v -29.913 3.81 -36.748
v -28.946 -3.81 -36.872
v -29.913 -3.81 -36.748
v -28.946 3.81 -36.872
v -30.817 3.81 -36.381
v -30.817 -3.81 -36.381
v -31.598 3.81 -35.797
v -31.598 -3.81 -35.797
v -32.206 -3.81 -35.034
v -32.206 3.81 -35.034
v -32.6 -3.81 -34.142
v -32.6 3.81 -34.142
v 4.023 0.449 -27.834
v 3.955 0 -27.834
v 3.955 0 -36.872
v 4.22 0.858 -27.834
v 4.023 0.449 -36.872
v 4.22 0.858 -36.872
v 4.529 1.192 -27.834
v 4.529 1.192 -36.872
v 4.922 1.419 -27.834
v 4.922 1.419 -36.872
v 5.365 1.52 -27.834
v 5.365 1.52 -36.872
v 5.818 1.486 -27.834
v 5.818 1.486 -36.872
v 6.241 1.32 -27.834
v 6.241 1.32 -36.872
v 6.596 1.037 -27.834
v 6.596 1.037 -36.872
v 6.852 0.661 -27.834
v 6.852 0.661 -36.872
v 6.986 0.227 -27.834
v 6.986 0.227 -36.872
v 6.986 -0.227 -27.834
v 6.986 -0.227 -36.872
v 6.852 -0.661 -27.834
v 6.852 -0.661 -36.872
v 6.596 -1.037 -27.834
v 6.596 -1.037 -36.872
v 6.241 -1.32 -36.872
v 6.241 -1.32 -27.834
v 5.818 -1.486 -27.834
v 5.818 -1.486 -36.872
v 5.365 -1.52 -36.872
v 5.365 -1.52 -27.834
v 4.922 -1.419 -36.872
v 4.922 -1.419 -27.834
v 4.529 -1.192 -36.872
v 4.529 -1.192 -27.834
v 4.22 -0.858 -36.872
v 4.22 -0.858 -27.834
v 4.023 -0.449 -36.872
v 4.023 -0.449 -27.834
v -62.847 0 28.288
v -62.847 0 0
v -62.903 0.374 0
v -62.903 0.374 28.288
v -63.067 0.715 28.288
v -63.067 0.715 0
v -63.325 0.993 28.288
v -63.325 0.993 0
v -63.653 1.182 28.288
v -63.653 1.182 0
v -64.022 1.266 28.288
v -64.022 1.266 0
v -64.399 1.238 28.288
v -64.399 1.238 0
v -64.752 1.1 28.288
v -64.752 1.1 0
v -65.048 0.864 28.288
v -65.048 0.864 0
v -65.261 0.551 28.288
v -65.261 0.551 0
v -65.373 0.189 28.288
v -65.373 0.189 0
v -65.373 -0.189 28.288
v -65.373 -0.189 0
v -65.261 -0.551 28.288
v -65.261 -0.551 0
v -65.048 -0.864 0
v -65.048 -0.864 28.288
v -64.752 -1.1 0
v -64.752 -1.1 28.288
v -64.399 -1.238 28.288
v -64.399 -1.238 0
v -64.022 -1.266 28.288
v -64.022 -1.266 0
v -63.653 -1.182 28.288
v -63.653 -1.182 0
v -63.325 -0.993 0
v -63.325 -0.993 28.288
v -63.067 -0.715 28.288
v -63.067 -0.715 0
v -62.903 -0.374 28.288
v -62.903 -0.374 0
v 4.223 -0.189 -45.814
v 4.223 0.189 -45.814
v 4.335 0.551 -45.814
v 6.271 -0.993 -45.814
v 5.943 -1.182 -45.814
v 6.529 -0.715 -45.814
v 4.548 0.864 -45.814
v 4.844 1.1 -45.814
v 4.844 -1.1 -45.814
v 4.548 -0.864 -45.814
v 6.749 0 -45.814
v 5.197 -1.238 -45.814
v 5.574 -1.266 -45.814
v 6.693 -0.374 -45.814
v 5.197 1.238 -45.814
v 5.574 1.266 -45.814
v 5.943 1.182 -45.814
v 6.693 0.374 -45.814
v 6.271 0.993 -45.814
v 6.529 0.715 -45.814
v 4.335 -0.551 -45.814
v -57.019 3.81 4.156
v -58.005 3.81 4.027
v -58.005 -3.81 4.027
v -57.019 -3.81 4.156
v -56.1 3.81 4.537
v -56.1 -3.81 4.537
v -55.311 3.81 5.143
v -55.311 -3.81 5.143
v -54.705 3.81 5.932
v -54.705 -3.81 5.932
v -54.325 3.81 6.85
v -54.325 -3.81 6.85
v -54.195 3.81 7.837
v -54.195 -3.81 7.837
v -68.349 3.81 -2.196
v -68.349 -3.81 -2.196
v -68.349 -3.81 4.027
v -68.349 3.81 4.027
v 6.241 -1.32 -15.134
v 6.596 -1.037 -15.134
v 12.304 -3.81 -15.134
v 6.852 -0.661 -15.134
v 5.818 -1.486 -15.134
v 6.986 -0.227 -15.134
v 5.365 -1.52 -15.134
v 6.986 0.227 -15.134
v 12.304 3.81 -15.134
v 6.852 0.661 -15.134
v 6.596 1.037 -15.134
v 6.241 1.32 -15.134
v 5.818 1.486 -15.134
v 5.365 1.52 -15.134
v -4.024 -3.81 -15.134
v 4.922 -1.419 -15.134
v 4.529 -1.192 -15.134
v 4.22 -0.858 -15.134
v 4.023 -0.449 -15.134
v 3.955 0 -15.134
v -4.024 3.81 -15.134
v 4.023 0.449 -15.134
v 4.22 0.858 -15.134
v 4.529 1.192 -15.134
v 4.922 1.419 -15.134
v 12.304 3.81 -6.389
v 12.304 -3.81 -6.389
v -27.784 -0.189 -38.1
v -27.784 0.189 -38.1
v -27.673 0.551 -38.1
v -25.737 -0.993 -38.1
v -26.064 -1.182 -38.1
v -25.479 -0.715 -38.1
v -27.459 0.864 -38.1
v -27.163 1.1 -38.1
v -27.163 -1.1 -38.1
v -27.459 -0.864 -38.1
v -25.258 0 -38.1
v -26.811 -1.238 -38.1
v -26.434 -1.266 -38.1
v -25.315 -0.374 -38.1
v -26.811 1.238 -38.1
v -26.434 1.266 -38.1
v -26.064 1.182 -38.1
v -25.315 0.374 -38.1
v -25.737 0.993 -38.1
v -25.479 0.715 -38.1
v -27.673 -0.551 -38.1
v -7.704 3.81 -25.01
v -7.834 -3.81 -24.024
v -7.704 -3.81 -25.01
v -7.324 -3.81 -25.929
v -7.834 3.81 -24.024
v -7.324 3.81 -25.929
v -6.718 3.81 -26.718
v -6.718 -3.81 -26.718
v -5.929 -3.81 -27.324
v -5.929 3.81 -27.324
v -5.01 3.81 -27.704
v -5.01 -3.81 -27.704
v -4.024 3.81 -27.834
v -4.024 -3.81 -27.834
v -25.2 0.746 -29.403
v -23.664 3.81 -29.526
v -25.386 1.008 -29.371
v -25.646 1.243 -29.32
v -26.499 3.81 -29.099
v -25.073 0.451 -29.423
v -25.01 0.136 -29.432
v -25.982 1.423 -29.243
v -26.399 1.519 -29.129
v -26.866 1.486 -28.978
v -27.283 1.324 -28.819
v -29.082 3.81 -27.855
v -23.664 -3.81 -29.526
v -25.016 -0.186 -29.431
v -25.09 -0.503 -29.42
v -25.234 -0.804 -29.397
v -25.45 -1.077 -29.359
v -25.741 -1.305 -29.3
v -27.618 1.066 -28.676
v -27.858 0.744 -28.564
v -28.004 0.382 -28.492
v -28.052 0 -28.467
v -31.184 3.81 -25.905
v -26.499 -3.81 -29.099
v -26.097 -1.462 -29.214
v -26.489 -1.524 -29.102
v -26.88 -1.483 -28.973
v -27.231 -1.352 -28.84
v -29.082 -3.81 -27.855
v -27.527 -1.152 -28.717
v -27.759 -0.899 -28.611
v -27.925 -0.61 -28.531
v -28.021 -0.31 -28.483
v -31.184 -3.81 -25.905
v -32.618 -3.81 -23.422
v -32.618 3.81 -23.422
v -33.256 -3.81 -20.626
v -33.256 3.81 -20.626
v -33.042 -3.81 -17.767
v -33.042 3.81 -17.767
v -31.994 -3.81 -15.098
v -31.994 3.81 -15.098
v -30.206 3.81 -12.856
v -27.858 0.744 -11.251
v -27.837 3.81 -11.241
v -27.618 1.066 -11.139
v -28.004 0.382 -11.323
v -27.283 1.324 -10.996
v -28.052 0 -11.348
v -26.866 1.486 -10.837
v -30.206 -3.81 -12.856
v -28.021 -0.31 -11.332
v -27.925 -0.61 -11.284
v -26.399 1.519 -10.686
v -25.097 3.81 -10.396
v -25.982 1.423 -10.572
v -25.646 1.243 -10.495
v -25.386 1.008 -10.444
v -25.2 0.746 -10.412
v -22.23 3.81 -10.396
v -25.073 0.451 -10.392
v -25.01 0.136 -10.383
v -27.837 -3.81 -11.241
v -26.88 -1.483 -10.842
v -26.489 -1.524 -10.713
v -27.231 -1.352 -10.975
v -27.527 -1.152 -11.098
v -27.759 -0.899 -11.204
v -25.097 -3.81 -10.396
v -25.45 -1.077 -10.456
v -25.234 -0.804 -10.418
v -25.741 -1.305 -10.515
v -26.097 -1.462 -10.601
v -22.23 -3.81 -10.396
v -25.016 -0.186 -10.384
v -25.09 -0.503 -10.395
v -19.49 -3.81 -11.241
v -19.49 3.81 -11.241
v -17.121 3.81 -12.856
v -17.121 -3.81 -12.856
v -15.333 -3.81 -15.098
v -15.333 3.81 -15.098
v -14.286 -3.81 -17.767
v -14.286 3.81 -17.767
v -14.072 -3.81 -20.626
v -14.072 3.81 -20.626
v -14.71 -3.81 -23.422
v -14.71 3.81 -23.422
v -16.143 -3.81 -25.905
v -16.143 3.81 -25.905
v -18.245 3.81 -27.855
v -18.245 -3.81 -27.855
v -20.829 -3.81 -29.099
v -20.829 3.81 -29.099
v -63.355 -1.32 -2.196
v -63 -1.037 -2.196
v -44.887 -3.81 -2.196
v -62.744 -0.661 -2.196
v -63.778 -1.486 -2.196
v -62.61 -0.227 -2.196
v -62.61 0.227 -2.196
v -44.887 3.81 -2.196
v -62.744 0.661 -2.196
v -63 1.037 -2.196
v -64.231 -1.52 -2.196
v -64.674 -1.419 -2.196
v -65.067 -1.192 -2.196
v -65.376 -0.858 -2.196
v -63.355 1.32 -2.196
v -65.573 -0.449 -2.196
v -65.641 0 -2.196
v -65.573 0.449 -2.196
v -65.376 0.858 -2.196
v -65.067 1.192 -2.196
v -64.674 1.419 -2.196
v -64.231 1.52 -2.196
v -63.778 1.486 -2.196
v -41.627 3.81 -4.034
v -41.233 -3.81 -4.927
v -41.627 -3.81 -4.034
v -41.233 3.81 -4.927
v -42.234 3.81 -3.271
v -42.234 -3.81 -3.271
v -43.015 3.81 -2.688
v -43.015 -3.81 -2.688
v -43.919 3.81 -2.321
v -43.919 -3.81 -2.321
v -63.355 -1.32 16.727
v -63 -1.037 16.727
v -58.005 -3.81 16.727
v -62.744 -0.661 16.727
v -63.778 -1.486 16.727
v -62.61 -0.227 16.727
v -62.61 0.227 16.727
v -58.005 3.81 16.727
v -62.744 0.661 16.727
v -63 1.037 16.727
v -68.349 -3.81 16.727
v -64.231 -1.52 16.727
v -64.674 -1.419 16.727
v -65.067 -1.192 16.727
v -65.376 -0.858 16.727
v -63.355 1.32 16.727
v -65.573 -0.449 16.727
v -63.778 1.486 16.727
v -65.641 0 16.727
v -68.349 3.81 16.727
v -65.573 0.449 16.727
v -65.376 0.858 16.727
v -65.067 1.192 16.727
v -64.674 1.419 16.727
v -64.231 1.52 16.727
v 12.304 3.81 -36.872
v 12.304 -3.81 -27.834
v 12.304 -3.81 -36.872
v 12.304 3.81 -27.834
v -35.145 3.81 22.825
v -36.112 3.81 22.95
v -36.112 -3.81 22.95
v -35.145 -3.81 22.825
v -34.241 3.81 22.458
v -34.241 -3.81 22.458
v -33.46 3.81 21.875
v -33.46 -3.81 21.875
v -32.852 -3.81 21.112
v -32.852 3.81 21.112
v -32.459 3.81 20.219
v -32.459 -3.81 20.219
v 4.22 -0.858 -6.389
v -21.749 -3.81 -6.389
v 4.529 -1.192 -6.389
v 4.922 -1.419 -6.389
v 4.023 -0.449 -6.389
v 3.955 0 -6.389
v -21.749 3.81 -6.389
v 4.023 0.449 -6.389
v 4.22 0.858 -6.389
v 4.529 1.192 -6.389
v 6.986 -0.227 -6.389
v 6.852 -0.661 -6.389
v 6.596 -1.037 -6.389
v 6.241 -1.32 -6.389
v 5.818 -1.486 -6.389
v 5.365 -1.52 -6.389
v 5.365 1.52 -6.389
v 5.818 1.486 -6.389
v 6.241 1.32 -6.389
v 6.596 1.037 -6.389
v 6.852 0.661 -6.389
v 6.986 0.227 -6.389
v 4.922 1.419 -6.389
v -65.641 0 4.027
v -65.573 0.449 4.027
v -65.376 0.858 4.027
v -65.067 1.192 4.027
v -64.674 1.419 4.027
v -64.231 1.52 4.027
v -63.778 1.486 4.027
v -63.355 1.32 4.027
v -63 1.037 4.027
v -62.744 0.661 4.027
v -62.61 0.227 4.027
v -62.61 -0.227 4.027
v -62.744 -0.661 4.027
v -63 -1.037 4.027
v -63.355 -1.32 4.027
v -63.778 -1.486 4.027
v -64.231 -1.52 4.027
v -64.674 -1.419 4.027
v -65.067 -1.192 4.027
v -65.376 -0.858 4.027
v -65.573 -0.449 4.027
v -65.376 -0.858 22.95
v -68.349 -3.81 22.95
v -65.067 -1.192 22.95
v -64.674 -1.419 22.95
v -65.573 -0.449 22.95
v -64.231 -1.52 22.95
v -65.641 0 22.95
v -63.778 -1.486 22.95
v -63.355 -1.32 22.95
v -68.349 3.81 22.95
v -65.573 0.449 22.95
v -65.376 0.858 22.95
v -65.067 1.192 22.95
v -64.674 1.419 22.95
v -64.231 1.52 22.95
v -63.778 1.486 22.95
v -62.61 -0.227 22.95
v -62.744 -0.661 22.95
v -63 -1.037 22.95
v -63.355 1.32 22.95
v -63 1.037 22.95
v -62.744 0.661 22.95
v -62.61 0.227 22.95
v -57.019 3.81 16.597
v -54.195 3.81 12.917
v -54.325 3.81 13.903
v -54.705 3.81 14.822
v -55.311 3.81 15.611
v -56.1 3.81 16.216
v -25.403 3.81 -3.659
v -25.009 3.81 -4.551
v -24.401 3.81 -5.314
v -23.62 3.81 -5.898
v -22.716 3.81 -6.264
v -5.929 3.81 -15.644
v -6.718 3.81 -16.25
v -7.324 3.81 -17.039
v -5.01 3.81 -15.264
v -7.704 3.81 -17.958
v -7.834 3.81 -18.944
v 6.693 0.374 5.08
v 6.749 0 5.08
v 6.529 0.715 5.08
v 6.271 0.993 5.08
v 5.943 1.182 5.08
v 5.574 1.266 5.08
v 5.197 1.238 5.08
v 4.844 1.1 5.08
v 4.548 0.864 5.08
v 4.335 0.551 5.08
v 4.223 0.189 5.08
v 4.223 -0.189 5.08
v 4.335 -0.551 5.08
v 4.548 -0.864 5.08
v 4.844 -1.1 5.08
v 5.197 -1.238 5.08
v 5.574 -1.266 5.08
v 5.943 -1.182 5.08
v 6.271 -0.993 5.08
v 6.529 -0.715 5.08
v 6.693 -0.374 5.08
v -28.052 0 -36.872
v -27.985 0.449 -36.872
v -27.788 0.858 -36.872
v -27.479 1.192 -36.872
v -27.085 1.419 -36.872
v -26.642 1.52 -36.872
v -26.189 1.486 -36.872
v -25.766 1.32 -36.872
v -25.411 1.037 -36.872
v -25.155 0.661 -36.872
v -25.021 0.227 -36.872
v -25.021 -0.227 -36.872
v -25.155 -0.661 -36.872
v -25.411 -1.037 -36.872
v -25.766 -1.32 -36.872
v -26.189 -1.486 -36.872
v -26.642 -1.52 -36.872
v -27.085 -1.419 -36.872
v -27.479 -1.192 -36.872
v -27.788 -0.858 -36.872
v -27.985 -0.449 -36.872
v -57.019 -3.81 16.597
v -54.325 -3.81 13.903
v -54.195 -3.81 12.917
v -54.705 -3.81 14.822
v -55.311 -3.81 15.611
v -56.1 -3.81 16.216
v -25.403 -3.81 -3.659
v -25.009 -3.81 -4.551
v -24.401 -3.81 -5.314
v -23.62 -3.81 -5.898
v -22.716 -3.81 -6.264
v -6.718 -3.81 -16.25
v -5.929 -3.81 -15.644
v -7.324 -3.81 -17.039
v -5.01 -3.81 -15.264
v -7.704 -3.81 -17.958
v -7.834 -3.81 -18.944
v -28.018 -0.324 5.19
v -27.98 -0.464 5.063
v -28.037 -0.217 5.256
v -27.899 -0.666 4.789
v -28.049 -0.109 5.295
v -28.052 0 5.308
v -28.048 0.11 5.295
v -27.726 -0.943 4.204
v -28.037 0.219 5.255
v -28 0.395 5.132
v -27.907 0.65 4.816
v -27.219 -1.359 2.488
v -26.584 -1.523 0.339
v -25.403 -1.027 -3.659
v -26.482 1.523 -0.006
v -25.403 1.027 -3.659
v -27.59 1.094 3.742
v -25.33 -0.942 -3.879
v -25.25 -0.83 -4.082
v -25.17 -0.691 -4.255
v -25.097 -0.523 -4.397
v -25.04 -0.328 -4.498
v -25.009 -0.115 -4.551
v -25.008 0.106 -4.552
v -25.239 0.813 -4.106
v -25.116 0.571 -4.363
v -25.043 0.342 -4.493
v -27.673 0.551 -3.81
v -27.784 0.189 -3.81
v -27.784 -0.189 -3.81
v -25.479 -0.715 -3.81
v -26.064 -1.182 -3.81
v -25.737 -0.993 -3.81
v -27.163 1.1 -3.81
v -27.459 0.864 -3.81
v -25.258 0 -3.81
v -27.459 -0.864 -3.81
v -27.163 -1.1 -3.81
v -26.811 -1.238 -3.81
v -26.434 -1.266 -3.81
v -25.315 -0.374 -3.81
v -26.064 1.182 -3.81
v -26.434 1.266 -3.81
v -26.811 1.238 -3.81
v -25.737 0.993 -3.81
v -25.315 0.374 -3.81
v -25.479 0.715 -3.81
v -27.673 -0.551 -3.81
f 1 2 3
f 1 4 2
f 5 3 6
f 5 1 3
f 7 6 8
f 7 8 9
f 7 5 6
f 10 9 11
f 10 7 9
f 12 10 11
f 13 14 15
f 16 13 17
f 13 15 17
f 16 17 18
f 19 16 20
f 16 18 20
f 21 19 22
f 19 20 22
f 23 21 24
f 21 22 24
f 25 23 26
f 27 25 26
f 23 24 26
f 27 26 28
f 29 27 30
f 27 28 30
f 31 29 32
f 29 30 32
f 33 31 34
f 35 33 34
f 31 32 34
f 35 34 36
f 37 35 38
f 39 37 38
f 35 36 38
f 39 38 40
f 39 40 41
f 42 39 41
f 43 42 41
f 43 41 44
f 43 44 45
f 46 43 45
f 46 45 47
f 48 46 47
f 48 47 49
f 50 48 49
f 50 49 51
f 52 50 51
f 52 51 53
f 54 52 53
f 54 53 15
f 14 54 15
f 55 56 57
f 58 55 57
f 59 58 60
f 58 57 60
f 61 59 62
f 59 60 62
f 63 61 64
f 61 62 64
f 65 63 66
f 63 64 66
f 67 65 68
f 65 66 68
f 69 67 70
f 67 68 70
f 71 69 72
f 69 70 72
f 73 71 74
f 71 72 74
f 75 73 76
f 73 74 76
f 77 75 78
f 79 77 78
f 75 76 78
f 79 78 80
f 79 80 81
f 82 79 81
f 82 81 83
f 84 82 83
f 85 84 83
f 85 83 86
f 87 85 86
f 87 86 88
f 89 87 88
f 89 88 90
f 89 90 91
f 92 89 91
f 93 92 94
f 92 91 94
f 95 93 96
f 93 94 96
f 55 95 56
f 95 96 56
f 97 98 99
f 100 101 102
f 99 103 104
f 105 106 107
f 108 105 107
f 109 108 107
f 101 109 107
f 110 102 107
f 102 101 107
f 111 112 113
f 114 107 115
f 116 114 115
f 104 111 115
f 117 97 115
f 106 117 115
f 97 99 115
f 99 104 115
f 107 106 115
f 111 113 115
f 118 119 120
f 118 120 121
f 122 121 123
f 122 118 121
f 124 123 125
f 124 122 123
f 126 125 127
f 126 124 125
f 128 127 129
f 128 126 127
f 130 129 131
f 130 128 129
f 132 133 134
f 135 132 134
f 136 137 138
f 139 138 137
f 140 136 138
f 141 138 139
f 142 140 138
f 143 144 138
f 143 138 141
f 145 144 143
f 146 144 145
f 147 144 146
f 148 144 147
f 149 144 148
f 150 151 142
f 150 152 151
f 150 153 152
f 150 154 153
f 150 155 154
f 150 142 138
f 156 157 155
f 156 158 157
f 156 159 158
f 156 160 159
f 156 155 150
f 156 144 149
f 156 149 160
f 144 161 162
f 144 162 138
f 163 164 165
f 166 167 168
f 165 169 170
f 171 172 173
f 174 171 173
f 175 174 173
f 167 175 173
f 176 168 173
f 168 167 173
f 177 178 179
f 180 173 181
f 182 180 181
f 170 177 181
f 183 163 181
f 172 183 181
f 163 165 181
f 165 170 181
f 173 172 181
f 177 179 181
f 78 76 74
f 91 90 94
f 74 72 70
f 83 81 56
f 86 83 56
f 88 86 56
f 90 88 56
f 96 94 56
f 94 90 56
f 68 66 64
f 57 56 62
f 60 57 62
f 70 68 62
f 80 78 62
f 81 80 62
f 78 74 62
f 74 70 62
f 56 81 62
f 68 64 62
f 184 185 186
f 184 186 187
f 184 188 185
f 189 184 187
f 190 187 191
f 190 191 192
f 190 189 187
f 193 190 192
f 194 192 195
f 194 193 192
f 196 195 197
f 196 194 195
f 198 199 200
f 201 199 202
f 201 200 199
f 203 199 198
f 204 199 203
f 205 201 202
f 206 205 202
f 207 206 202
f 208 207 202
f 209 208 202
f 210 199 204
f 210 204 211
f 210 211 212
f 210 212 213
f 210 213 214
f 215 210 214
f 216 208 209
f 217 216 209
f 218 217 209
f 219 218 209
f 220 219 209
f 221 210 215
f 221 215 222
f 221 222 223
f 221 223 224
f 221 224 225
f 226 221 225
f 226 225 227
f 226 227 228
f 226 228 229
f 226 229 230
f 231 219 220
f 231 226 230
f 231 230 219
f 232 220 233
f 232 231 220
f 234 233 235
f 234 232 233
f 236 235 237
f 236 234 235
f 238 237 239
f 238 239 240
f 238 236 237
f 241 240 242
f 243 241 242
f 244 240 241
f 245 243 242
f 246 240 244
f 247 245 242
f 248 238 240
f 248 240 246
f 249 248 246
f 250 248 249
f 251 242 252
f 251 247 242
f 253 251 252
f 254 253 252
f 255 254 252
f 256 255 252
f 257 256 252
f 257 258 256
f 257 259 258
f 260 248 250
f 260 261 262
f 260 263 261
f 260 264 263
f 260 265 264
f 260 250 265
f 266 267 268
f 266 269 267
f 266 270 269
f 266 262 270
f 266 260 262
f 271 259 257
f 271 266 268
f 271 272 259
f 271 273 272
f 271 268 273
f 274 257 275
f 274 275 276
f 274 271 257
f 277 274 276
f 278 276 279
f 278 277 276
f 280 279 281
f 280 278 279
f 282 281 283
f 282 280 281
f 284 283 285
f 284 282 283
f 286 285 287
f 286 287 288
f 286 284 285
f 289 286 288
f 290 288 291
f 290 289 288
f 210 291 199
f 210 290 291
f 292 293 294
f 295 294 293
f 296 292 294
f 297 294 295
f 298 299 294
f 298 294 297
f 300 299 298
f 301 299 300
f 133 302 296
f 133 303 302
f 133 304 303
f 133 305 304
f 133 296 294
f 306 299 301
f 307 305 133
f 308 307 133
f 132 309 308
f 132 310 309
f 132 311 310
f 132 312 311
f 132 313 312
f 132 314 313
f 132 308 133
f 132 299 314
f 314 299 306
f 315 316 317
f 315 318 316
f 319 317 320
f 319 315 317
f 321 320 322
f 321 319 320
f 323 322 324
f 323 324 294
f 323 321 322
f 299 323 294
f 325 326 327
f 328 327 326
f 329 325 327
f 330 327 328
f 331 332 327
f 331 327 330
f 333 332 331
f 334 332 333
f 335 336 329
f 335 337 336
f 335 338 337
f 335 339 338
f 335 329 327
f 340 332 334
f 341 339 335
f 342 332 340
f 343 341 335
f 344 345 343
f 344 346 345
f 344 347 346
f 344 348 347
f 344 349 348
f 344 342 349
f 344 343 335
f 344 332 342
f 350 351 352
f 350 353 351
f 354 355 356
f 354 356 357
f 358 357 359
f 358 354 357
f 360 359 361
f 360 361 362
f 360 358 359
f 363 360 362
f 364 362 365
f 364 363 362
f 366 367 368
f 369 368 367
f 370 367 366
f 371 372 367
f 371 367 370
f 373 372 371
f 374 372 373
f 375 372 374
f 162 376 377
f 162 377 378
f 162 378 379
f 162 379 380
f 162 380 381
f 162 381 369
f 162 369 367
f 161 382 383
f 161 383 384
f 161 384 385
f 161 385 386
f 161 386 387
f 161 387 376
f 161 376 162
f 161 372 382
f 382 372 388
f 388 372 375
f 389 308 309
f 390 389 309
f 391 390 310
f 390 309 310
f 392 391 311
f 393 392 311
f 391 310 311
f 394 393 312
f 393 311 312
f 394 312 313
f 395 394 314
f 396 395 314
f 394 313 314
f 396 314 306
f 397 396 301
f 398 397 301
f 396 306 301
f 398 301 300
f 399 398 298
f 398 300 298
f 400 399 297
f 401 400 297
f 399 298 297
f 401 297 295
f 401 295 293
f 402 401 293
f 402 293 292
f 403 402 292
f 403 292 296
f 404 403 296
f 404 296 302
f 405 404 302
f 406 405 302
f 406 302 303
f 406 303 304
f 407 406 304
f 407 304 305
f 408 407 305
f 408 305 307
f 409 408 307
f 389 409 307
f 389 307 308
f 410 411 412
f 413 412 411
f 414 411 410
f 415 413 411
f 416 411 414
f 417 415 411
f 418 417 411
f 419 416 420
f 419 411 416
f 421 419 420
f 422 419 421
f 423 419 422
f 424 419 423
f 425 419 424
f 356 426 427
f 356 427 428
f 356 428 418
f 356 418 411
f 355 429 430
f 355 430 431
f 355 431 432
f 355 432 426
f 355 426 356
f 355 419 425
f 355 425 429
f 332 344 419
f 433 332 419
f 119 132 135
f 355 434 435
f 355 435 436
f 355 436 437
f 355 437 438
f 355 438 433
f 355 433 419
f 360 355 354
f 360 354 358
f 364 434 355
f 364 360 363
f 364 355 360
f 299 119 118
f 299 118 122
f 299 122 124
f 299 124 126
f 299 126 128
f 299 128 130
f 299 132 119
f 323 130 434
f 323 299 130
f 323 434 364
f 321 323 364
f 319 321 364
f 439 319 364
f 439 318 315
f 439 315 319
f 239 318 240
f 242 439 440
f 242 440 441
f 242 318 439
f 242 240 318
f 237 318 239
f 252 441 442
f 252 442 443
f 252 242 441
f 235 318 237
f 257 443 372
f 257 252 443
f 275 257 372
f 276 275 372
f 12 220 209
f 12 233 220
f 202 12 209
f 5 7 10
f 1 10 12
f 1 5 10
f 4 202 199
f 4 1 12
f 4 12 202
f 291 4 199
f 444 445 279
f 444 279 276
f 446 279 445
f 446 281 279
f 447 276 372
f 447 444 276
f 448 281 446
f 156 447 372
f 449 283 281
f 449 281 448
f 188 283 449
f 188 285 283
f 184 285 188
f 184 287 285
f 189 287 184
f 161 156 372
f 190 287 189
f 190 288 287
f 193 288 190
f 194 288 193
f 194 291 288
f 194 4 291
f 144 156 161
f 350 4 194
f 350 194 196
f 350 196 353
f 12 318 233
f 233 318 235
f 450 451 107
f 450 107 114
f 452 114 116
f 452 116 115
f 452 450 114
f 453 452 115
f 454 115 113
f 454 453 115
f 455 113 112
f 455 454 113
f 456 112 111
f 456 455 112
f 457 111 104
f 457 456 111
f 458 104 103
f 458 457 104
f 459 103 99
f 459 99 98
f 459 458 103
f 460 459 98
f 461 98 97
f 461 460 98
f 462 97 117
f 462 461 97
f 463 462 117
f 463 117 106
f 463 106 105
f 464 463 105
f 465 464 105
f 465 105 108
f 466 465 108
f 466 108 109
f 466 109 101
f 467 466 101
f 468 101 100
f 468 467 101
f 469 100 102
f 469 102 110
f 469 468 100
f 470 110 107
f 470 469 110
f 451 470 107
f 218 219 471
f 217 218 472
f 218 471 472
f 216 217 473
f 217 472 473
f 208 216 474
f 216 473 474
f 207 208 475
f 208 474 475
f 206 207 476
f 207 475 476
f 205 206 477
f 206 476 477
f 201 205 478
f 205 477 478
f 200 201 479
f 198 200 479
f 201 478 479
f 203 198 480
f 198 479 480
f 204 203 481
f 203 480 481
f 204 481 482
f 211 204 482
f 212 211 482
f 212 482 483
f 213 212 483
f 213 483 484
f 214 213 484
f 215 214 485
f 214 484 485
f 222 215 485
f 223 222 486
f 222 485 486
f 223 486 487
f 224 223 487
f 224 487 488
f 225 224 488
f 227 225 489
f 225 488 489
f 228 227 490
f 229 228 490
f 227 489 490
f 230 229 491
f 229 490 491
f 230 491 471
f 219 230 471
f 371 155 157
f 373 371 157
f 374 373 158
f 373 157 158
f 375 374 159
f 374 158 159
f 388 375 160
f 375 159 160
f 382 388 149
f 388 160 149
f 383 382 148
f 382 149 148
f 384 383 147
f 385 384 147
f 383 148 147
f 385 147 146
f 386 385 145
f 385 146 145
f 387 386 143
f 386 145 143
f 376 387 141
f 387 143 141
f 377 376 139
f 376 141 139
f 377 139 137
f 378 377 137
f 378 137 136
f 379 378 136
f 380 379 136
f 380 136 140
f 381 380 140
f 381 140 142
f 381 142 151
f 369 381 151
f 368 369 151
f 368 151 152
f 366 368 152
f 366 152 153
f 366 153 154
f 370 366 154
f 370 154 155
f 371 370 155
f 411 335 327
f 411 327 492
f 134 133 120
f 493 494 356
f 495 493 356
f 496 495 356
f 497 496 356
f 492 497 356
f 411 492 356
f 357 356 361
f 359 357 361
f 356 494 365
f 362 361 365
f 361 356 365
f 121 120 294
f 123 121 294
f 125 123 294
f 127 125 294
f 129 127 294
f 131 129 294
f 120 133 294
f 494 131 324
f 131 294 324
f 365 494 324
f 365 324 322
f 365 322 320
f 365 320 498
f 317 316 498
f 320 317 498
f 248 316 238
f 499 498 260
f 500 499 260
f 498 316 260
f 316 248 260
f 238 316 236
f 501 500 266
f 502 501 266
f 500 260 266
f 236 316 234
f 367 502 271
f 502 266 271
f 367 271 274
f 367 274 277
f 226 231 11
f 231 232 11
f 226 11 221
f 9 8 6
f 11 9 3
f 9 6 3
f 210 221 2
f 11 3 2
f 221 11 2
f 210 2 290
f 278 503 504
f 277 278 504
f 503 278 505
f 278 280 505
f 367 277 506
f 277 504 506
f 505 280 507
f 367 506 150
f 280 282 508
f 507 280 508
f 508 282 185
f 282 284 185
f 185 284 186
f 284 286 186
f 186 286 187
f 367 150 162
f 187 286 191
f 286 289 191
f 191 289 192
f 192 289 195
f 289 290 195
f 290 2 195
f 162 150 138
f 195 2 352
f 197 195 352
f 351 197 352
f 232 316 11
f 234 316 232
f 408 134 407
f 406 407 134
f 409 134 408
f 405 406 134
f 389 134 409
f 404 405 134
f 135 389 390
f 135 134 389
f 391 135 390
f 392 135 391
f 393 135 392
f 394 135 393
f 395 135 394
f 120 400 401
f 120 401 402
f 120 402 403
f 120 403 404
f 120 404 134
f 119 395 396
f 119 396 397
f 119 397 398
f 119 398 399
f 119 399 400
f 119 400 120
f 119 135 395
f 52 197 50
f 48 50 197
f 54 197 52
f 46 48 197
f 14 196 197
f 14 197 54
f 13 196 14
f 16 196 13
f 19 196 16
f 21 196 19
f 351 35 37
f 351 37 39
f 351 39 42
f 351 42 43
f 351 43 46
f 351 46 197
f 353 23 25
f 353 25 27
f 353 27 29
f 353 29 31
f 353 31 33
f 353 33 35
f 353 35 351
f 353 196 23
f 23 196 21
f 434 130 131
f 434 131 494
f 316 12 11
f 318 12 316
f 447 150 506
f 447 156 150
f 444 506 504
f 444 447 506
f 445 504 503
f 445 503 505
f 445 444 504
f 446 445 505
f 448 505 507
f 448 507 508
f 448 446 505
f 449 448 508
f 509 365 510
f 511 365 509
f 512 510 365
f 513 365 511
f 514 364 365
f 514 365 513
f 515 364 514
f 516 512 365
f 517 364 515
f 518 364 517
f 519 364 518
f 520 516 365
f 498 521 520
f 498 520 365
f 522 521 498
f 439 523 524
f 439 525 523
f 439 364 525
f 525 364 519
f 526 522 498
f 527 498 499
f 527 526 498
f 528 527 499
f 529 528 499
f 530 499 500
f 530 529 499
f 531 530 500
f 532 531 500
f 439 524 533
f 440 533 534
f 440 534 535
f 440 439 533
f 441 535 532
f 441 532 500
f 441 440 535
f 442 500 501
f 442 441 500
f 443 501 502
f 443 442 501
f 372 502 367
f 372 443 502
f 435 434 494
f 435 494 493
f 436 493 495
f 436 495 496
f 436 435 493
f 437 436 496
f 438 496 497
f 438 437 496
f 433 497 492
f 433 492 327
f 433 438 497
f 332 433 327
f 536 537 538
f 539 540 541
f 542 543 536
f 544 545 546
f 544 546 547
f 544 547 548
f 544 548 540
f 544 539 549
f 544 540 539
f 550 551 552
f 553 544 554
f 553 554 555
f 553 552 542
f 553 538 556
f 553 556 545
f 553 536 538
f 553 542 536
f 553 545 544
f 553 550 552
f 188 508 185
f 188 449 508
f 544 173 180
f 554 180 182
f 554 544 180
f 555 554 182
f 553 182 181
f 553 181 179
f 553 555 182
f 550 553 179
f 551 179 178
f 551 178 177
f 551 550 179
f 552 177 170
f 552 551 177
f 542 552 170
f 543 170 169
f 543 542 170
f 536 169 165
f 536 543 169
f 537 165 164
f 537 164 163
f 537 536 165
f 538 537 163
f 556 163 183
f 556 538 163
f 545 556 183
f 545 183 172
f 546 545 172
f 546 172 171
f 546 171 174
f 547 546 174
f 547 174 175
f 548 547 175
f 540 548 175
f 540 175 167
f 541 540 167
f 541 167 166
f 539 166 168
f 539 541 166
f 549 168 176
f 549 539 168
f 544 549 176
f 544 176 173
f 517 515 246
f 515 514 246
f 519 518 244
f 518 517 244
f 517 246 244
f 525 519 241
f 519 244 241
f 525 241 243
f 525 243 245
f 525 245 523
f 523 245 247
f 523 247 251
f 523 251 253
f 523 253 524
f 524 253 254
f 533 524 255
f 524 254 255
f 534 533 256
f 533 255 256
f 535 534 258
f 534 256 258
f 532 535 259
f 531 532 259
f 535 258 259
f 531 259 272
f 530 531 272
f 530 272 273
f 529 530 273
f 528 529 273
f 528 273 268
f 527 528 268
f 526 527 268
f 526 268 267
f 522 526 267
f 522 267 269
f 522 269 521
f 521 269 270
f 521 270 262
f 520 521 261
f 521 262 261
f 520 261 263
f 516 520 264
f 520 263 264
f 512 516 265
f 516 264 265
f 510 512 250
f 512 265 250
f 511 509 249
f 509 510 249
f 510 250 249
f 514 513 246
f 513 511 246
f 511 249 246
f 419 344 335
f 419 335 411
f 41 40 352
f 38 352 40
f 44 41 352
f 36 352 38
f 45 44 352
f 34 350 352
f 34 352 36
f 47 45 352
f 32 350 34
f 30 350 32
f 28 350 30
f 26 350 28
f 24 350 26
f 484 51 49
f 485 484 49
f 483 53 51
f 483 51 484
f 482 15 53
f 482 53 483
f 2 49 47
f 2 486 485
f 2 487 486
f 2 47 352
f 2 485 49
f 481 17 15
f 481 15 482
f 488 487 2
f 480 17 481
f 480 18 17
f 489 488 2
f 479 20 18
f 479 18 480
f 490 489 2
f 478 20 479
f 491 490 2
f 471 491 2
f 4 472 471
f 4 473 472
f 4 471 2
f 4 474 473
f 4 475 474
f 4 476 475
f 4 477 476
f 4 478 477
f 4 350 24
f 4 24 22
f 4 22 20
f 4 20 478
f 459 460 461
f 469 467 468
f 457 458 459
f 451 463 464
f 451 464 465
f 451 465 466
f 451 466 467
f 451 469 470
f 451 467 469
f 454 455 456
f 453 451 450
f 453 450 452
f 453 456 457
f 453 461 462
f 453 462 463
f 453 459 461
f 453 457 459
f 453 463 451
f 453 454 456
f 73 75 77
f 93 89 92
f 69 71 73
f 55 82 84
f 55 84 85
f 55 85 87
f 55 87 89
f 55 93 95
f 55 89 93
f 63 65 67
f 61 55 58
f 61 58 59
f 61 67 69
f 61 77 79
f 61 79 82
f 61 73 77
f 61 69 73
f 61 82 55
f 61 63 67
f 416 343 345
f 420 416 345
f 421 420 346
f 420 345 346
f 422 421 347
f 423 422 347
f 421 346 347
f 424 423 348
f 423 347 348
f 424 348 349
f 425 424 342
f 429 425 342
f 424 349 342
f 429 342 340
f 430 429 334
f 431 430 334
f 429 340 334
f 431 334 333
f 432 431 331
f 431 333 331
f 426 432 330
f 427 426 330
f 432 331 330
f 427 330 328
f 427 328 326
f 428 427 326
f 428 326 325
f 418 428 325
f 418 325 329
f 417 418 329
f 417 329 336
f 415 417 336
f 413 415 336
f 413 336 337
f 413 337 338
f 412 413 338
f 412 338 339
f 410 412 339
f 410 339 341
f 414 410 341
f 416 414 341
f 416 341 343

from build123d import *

# Parameters (mm, degrees)
SKETCH21_R         = 9.618966791
EXTRUDE1_DEPTH     = 3.81
SKETCH22_R         = 1.524
CUT_EXTRUDE1_DEPTH = 91.7575
EXTRUDE2_START     = -3.81
SKETCH24_R         = 1.27
EXTRUDE2_DEPTH     = 34.29
SKETCH24_3_R       = 1.27
EXTRUDE3_DEPTH     = 28.288
EXTRUDE4_START     = 5.08
SKETCH24_4_R       = 1.27
EXTRUDE4_DEPTH     = 50.894


with BuildPart() as part:
    # Sketch21 → Extrude1 (new, symmetric)
    with BuildSketch(Plane(origin=(0, 0, 0), x_dir=(1, 0, 0), z_dir=(0, 1, 0))):
        with BuildLine():
            Line((-68.34927062, -4.026580717), (-58.004863859, -4.026580717))
            ThreePointArc((-58.004863859, -4.026580717), (-55.310787023, -5.142503881), (-54.194863859, -7.836580717))
            Line((-54.194863859, -7.836580717), (-54.194863859, -12.916580717))
            ThreePointArc((-54.194863859, -12.916580717), (-55.310787023, -15.610657554), (-58.004863859, -16.726580717))
            Line((-58.004863859, -16.726580717), (-68.34927062, -16.726580717))
            Line((-68.34927062, -16.726580717), (-68.34927062, -22.949580717))
            Line((-68.34927062, -22.949580717), (-36.112461516, -22.949580717))
            ThreePointArc((-36.112461516, -22.949580717), (-33.831842297, -22.191608892), (-32.458648334, -20.219279394))
            Line((-32.458648334, -20.219279394), (-25.402661098, 3.658918981))
            ThreePointArc((-25.402661098, 3.658918981), (-24.029467135, 5.631248479), (-21.748847916, 6.389220304))
            Line((-21.748847916, 6.389220304), (12.303763798, 6.389220304))
            Line((12.303763798, 6.389220304), (12.303763798, 15.133953501))
            Line((12.303763798, 15.133953501), (-4.02424507, 15.133953501))
            ThreePointArc((-4.02424507, 15.133953501), (-6.718321906, 16.249876665), (-7.83424507, 18.943953501))
            Line((-7.83424507, 18.943953501), (-7.83424507, 24.023953501))
            ThreePointArc((-7.83424507, 24.023953501), (-6.718321906, 26.718030338), (-4.02424507, 27.833953501))
            Line((-4.02424507, 27.833953501), (12.303763798, 27.833953501))
            Line((12.303763798, 27.833953501), (12.303763798, 36.872358218))
            Line((12.303763798, 36.872358218), (-28.945825611, 36.872358218))
            ThreePointArc((-28.945825611, 36.872358218), (-31.22644483, 36.114386393), (-32.599638793, 34.142056894))
            Line((-32.599638793, 34.142056894), (-41.232745726, 4.926720606))
            ThreePointArc((-41.232745726, 4.926720606), (-42.605939689, 2.954391108), (-44.886558908, 2.196419283))
            Line((-44.886558908, 2.196419283), (-68.34927062, 2.196419283))
            Line((-68.34927062, 2.196419283), (-68.34927062, -4.026580717))
        make_face()
        with Locations(Location((-23.6637447, 19.907505249, 0), (0, 0, 90))):
            Circle(SKETCH21_R, mode=Mode.SUBTRACT)
    extrude(amount=EXTRUDE1_DEPTH, both=True)

    # Sketch22 → Cut-Extrude1 (cut, symmetric)
    with BuildSketch(Plane(origin=(0, 0, -36.872358218), x_dir=(-1, 0, 0), z_dir=(0, 0, -1))):
        with Locations((-5.47919097, 0)):
            Circle(SKETCH22_R)
        with Locations((64.11680903, 0)):
            Circle(SKETCH22_R)
        with Locations((26.528431516, 0)):
            Circle(SKETCH22_R)
    extrude(amount=CUT_EXTRUDE1_DEPTH, both=True, mode=Mode.SUBTRACT)


with BuildPart() as body_2:
    # Sketch24 → Extrude2 (new body)
    with BuildSketch(Plane.XY.offset(EXTRUDE2_START)):
        with Locations((-26.528431516, 0)):
            Circle(SKETCH24_R)
    extrude(amount=-EXTRUDE2_DEPTH)


with BuildPart() as body_3:
    # Sketch24<3> → Extrude3 (new body)
    with BuildSketch(Plane.XY):
        with Locations((-64.11680903, 0)):
            Circle(SKETCH24_3_R)
    extrude(amount=EXTRUDE3_DEPTH)


with BuildPart() as body_4:
    # Sketch24<4> → Extrude4 (new body)
    with BuildSketch(Plane.XY.offset(EXTRUDE4_START)):
        with Locations((5.47919097, 0)):
            Circle(SKETCH24_4_R)
    extrude(amount=-EXTRUDE4_DEPTH)


solid = Compound([part.part, body_2.part, body_3.part, body_4.part])
